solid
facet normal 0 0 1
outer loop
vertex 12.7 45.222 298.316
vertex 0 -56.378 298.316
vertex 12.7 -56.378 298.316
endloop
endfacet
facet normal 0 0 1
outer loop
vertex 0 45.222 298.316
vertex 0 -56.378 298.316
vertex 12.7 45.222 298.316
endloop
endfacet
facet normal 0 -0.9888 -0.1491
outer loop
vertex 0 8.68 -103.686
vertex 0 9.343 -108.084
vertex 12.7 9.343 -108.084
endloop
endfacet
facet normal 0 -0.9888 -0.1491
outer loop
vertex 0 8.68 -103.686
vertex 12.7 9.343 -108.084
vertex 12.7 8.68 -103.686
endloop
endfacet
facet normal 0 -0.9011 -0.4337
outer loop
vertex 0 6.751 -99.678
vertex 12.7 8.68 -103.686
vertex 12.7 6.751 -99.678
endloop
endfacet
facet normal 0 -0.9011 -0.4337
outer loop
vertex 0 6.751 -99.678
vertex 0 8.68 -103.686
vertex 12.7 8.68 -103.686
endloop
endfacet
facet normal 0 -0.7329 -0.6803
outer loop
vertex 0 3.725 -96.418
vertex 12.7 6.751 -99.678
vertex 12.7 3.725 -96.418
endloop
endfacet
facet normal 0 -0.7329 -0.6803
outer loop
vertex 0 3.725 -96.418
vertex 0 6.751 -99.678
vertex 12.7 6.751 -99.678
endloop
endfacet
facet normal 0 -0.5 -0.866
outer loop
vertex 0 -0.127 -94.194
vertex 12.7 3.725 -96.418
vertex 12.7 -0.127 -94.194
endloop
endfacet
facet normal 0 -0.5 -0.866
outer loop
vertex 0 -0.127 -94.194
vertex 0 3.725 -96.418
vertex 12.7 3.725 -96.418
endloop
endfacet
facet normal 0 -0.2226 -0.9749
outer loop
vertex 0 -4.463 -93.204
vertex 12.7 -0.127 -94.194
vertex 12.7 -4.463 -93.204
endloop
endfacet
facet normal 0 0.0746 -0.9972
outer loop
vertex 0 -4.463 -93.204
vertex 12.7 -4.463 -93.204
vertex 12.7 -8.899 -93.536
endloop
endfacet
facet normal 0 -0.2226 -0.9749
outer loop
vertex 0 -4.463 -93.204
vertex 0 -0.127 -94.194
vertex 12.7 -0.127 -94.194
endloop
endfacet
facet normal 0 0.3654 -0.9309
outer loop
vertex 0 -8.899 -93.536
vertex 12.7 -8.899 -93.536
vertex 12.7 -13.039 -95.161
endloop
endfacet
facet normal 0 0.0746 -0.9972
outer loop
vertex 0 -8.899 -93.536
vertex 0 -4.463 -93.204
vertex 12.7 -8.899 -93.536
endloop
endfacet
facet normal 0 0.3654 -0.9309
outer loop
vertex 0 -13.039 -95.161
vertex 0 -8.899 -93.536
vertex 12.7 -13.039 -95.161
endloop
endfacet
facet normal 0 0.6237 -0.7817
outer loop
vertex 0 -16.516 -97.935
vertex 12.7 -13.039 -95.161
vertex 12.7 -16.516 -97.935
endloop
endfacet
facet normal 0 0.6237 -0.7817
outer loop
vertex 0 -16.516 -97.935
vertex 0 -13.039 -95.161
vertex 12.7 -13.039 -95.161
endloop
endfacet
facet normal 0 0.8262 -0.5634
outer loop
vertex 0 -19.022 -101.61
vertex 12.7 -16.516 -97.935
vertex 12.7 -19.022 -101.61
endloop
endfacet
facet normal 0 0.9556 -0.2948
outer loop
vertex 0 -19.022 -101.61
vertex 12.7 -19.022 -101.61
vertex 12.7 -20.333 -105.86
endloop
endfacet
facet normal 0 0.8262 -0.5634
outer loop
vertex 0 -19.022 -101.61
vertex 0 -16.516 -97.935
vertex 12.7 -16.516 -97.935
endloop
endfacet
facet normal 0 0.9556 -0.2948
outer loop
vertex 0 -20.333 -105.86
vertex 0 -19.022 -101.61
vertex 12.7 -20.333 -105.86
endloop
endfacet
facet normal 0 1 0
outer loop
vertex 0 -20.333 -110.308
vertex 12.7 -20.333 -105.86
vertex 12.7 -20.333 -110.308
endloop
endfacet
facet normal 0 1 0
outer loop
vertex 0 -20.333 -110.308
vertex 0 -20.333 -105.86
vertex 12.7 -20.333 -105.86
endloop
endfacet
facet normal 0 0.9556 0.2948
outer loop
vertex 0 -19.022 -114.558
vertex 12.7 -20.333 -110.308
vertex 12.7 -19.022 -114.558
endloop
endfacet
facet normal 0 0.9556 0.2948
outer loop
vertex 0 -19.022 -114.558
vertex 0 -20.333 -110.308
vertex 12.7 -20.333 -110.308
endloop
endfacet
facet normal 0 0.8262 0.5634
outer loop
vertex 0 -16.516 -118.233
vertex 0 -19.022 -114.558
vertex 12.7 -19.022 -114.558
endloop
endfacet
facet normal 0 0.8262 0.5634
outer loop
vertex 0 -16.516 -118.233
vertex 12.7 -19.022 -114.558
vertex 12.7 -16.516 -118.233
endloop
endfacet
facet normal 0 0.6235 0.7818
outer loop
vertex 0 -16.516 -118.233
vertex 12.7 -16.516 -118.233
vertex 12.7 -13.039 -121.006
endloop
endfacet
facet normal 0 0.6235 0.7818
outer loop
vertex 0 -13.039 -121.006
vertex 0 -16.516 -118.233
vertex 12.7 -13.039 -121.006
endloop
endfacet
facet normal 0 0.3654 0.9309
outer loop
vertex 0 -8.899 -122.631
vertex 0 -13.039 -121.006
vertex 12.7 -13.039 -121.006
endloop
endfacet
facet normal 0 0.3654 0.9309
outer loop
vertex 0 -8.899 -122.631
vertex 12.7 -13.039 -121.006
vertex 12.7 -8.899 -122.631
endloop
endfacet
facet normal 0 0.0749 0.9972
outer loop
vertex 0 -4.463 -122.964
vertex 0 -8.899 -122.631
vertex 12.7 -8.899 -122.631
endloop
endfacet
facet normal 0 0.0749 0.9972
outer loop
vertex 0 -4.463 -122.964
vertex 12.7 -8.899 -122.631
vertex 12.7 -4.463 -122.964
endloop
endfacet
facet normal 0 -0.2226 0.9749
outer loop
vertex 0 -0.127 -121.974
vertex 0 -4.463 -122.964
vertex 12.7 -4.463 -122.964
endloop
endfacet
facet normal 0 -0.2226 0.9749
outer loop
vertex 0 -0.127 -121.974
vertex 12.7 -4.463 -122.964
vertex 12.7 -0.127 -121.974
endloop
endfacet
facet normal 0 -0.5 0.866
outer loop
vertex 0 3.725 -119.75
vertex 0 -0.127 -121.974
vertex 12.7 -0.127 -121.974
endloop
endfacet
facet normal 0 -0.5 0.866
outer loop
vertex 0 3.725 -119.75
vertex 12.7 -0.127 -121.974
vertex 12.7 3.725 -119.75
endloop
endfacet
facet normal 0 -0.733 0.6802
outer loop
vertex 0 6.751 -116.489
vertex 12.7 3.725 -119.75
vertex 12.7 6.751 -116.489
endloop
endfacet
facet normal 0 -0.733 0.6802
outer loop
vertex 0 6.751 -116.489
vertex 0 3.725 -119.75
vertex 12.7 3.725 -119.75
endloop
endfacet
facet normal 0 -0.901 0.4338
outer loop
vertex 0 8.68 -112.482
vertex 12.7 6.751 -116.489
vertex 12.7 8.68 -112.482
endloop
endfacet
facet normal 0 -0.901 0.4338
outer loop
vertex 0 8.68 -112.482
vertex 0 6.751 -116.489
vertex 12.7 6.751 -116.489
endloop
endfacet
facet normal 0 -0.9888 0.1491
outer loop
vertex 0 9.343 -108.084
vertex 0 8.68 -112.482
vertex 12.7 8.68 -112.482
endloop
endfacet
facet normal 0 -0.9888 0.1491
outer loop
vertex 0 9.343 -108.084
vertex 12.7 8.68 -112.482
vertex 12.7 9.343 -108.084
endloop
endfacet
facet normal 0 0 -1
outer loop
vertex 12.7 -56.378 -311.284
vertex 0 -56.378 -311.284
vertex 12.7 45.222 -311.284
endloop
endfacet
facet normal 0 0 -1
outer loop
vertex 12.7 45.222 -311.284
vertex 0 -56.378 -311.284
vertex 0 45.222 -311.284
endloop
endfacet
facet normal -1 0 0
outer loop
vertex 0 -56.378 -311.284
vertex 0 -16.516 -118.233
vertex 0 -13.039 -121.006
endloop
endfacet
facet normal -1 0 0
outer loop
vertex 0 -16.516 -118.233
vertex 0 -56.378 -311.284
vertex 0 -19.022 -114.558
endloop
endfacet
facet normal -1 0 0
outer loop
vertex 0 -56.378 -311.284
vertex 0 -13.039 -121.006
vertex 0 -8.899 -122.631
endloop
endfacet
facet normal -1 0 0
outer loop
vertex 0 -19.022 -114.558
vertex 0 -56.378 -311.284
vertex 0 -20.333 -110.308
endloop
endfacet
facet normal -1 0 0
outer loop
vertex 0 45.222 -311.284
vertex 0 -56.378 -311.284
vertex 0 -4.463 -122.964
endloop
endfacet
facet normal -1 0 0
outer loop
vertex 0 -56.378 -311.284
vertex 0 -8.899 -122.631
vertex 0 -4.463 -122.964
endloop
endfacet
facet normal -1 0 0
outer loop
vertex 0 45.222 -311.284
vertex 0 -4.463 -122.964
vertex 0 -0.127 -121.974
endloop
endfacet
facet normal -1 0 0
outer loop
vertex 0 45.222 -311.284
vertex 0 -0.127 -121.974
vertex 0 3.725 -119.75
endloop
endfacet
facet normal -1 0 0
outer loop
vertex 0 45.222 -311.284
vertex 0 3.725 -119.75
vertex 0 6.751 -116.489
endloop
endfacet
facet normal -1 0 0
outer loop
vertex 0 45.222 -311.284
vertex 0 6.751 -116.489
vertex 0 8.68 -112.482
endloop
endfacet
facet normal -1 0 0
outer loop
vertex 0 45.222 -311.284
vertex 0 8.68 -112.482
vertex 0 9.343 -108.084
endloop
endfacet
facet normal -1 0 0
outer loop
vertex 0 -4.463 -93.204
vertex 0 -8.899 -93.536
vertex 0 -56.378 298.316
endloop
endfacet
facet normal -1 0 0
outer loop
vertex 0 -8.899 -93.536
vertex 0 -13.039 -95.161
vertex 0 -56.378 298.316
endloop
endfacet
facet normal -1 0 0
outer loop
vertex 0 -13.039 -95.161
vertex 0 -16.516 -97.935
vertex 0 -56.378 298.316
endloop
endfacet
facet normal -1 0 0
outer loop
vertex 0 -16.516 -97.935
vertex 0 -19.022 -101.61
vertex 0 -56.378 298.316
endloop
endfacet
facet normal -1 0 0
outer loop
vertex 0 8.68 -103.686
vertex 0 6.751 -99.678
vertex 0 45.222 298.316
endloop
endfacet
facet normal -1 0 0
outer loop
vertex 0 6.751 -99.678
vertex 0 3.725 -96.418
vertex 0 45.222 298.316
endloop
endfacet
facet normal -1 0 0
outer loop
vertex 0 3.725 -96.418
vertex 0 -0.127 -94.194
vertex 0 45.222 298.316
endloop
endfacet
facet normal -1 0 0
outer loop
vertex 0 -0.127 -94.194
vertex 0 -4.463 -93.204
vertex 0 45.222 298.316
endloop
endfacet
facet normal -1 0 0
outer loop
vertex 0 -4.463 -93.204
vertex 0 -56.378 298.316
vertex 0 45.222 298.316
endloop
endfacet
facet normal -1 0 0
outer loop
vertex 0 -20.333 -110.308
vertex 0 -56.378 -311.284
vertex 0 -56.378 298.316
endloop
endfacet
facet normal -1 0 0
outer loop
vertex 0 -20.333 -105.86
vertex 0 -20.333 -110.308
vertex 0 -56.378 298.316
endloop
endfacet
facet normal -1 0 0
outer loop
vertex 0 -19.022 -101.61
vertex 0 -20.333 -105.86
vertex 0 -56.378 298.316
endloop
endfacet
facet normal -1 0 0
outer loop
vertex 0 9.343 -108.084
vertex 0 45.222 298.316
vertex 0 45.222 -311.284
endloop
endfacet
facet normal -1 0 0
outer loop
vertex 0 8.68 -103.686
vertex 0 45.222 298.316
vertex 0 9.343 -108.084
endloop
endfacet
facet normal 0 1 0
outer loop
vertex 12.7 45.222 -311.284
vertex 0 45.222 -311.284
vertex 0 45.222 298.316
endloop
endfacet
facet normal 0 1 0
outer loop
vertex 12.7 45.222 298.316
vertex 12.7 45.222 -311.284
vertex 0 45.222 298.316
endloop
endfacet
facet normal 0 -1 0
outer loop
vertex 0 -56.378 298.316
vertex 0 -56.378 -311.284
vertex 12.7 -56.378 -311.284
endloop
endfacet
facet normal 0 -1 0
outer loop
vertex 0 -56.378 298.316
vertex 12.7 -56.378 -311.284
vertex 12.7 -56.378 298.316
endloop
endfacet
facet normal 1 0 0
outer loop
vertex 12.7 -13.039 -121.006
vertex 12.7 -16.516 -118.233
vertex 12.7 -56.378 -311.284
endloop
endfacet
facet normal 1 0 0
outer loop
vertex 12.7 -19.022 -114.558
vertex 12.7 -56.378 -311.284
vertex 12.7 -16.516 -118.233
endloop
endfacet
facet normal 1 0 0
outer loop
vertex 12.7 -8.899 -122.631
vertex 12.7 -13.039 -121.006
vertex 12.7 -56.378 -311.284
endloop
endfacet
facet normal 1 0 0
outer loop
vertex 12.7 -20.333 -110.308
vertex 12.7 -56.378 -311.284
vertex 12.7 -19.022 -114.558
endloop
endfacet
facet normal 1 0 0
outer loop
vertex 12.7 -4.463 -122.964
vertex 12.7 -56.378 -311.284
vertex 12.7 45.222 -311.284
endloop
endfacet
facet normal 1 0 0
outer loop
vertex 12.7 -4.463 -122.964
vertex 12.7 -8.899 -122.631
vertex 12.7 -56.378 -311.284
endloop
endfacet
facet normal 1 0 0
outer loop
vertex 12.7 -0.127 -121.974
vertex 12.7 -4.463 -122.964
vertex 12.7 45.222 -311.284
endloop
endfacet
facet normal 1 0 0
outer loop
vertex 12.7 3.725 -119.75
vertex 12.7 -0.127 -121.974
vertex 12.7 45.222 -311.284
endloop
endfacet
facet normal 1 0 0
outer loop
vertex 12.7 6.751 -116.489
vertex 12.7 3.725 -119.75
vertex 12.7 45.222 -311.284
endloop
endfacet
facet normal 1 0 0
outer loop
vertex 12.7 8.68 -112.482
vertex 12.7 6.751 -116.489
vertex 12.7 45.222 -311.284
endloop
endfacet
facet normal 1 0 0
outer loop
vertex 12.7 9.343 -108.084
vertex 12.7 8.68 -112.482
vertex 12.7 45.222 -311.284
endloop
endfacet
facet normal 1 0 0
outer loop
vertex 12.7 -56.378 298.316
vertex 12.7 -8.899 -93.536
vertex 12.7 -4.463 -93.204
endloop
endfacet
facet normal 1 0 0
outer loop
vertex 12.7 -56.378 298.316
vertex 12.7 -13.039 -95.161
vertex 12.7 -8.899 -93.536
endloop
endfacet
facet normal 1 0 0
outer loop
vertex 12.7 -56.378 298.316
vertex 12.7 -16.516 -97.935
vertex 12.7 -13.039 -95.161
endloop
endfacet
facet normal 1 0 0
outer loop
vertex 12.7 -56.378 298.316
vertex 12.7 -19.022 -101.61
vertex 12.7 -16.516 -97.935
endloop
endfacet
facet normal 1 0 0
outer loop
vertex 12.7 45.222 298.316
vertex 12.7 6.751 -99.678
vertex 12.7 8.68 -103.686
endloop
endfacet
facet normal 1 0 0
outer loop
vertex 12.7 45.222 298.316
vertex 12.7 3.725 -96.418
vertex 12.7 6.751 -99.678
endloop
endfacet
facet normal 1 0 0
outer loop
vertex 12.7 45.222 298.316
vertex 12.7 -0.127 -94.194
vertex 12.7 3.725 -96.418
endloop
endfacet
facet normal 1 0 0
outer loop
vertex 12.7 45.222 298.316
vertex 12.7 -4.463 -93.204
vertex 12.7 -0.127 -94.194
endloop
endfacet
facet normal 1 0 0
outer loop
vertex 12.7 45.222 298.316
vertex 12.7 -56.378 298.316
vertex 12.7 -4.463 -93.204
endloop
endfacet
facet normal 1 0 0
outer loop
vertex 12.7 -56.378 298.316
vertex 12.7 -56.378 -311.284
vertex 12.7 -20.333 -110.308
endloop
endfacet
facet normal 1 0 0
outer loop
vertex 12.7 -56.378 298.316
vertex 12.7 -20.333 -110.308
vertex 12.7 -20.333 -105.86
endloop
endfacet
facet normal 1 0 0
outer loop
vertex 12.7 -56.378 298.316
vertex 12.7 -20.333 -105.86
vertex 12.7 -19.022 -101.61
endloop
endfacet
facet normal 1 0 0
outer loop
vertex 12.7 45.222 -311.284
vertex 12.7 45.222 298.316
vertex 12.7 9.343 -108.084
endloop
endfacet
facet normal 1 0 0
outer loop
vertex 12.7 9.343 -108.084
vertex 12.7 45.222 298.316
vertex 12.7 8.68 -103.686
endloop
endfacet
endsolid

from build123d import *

# Parameters (mm, degrees)
F0_W     = 101.6
F0_H     = 609.6
F0_R     = 14.921552
F1_DEPTH = 12.7
F2_DEPTH = 12.7


with BuildPart() as f1:
    # F0 (on Right) → F1 (new body)
    with BuildSketch(Plane.YZ):
        with Locations((-5.578191, -6.483793)):
            Rectangle(F0_W, F0_H)
        with Locations((-5.578191, -108.083793)):
            Circle(F0_R, mode=Mode.SUBTRACT)
    extrude(amount=F1_DEPTH)

    # F0 (on Right) → F2 (join)
    with BuildSketch(Plane.YZ):
        with Locations((-5.578191, -6.483793)):
            Rectangle(F0_W, F0_H)
        with Locations((-5.578191, -108.083793)):
            Circle(F0_R, mode=Mode.SUBTRACT)
    extrude(amount=F2_DEPTH)


solid = f1.part
